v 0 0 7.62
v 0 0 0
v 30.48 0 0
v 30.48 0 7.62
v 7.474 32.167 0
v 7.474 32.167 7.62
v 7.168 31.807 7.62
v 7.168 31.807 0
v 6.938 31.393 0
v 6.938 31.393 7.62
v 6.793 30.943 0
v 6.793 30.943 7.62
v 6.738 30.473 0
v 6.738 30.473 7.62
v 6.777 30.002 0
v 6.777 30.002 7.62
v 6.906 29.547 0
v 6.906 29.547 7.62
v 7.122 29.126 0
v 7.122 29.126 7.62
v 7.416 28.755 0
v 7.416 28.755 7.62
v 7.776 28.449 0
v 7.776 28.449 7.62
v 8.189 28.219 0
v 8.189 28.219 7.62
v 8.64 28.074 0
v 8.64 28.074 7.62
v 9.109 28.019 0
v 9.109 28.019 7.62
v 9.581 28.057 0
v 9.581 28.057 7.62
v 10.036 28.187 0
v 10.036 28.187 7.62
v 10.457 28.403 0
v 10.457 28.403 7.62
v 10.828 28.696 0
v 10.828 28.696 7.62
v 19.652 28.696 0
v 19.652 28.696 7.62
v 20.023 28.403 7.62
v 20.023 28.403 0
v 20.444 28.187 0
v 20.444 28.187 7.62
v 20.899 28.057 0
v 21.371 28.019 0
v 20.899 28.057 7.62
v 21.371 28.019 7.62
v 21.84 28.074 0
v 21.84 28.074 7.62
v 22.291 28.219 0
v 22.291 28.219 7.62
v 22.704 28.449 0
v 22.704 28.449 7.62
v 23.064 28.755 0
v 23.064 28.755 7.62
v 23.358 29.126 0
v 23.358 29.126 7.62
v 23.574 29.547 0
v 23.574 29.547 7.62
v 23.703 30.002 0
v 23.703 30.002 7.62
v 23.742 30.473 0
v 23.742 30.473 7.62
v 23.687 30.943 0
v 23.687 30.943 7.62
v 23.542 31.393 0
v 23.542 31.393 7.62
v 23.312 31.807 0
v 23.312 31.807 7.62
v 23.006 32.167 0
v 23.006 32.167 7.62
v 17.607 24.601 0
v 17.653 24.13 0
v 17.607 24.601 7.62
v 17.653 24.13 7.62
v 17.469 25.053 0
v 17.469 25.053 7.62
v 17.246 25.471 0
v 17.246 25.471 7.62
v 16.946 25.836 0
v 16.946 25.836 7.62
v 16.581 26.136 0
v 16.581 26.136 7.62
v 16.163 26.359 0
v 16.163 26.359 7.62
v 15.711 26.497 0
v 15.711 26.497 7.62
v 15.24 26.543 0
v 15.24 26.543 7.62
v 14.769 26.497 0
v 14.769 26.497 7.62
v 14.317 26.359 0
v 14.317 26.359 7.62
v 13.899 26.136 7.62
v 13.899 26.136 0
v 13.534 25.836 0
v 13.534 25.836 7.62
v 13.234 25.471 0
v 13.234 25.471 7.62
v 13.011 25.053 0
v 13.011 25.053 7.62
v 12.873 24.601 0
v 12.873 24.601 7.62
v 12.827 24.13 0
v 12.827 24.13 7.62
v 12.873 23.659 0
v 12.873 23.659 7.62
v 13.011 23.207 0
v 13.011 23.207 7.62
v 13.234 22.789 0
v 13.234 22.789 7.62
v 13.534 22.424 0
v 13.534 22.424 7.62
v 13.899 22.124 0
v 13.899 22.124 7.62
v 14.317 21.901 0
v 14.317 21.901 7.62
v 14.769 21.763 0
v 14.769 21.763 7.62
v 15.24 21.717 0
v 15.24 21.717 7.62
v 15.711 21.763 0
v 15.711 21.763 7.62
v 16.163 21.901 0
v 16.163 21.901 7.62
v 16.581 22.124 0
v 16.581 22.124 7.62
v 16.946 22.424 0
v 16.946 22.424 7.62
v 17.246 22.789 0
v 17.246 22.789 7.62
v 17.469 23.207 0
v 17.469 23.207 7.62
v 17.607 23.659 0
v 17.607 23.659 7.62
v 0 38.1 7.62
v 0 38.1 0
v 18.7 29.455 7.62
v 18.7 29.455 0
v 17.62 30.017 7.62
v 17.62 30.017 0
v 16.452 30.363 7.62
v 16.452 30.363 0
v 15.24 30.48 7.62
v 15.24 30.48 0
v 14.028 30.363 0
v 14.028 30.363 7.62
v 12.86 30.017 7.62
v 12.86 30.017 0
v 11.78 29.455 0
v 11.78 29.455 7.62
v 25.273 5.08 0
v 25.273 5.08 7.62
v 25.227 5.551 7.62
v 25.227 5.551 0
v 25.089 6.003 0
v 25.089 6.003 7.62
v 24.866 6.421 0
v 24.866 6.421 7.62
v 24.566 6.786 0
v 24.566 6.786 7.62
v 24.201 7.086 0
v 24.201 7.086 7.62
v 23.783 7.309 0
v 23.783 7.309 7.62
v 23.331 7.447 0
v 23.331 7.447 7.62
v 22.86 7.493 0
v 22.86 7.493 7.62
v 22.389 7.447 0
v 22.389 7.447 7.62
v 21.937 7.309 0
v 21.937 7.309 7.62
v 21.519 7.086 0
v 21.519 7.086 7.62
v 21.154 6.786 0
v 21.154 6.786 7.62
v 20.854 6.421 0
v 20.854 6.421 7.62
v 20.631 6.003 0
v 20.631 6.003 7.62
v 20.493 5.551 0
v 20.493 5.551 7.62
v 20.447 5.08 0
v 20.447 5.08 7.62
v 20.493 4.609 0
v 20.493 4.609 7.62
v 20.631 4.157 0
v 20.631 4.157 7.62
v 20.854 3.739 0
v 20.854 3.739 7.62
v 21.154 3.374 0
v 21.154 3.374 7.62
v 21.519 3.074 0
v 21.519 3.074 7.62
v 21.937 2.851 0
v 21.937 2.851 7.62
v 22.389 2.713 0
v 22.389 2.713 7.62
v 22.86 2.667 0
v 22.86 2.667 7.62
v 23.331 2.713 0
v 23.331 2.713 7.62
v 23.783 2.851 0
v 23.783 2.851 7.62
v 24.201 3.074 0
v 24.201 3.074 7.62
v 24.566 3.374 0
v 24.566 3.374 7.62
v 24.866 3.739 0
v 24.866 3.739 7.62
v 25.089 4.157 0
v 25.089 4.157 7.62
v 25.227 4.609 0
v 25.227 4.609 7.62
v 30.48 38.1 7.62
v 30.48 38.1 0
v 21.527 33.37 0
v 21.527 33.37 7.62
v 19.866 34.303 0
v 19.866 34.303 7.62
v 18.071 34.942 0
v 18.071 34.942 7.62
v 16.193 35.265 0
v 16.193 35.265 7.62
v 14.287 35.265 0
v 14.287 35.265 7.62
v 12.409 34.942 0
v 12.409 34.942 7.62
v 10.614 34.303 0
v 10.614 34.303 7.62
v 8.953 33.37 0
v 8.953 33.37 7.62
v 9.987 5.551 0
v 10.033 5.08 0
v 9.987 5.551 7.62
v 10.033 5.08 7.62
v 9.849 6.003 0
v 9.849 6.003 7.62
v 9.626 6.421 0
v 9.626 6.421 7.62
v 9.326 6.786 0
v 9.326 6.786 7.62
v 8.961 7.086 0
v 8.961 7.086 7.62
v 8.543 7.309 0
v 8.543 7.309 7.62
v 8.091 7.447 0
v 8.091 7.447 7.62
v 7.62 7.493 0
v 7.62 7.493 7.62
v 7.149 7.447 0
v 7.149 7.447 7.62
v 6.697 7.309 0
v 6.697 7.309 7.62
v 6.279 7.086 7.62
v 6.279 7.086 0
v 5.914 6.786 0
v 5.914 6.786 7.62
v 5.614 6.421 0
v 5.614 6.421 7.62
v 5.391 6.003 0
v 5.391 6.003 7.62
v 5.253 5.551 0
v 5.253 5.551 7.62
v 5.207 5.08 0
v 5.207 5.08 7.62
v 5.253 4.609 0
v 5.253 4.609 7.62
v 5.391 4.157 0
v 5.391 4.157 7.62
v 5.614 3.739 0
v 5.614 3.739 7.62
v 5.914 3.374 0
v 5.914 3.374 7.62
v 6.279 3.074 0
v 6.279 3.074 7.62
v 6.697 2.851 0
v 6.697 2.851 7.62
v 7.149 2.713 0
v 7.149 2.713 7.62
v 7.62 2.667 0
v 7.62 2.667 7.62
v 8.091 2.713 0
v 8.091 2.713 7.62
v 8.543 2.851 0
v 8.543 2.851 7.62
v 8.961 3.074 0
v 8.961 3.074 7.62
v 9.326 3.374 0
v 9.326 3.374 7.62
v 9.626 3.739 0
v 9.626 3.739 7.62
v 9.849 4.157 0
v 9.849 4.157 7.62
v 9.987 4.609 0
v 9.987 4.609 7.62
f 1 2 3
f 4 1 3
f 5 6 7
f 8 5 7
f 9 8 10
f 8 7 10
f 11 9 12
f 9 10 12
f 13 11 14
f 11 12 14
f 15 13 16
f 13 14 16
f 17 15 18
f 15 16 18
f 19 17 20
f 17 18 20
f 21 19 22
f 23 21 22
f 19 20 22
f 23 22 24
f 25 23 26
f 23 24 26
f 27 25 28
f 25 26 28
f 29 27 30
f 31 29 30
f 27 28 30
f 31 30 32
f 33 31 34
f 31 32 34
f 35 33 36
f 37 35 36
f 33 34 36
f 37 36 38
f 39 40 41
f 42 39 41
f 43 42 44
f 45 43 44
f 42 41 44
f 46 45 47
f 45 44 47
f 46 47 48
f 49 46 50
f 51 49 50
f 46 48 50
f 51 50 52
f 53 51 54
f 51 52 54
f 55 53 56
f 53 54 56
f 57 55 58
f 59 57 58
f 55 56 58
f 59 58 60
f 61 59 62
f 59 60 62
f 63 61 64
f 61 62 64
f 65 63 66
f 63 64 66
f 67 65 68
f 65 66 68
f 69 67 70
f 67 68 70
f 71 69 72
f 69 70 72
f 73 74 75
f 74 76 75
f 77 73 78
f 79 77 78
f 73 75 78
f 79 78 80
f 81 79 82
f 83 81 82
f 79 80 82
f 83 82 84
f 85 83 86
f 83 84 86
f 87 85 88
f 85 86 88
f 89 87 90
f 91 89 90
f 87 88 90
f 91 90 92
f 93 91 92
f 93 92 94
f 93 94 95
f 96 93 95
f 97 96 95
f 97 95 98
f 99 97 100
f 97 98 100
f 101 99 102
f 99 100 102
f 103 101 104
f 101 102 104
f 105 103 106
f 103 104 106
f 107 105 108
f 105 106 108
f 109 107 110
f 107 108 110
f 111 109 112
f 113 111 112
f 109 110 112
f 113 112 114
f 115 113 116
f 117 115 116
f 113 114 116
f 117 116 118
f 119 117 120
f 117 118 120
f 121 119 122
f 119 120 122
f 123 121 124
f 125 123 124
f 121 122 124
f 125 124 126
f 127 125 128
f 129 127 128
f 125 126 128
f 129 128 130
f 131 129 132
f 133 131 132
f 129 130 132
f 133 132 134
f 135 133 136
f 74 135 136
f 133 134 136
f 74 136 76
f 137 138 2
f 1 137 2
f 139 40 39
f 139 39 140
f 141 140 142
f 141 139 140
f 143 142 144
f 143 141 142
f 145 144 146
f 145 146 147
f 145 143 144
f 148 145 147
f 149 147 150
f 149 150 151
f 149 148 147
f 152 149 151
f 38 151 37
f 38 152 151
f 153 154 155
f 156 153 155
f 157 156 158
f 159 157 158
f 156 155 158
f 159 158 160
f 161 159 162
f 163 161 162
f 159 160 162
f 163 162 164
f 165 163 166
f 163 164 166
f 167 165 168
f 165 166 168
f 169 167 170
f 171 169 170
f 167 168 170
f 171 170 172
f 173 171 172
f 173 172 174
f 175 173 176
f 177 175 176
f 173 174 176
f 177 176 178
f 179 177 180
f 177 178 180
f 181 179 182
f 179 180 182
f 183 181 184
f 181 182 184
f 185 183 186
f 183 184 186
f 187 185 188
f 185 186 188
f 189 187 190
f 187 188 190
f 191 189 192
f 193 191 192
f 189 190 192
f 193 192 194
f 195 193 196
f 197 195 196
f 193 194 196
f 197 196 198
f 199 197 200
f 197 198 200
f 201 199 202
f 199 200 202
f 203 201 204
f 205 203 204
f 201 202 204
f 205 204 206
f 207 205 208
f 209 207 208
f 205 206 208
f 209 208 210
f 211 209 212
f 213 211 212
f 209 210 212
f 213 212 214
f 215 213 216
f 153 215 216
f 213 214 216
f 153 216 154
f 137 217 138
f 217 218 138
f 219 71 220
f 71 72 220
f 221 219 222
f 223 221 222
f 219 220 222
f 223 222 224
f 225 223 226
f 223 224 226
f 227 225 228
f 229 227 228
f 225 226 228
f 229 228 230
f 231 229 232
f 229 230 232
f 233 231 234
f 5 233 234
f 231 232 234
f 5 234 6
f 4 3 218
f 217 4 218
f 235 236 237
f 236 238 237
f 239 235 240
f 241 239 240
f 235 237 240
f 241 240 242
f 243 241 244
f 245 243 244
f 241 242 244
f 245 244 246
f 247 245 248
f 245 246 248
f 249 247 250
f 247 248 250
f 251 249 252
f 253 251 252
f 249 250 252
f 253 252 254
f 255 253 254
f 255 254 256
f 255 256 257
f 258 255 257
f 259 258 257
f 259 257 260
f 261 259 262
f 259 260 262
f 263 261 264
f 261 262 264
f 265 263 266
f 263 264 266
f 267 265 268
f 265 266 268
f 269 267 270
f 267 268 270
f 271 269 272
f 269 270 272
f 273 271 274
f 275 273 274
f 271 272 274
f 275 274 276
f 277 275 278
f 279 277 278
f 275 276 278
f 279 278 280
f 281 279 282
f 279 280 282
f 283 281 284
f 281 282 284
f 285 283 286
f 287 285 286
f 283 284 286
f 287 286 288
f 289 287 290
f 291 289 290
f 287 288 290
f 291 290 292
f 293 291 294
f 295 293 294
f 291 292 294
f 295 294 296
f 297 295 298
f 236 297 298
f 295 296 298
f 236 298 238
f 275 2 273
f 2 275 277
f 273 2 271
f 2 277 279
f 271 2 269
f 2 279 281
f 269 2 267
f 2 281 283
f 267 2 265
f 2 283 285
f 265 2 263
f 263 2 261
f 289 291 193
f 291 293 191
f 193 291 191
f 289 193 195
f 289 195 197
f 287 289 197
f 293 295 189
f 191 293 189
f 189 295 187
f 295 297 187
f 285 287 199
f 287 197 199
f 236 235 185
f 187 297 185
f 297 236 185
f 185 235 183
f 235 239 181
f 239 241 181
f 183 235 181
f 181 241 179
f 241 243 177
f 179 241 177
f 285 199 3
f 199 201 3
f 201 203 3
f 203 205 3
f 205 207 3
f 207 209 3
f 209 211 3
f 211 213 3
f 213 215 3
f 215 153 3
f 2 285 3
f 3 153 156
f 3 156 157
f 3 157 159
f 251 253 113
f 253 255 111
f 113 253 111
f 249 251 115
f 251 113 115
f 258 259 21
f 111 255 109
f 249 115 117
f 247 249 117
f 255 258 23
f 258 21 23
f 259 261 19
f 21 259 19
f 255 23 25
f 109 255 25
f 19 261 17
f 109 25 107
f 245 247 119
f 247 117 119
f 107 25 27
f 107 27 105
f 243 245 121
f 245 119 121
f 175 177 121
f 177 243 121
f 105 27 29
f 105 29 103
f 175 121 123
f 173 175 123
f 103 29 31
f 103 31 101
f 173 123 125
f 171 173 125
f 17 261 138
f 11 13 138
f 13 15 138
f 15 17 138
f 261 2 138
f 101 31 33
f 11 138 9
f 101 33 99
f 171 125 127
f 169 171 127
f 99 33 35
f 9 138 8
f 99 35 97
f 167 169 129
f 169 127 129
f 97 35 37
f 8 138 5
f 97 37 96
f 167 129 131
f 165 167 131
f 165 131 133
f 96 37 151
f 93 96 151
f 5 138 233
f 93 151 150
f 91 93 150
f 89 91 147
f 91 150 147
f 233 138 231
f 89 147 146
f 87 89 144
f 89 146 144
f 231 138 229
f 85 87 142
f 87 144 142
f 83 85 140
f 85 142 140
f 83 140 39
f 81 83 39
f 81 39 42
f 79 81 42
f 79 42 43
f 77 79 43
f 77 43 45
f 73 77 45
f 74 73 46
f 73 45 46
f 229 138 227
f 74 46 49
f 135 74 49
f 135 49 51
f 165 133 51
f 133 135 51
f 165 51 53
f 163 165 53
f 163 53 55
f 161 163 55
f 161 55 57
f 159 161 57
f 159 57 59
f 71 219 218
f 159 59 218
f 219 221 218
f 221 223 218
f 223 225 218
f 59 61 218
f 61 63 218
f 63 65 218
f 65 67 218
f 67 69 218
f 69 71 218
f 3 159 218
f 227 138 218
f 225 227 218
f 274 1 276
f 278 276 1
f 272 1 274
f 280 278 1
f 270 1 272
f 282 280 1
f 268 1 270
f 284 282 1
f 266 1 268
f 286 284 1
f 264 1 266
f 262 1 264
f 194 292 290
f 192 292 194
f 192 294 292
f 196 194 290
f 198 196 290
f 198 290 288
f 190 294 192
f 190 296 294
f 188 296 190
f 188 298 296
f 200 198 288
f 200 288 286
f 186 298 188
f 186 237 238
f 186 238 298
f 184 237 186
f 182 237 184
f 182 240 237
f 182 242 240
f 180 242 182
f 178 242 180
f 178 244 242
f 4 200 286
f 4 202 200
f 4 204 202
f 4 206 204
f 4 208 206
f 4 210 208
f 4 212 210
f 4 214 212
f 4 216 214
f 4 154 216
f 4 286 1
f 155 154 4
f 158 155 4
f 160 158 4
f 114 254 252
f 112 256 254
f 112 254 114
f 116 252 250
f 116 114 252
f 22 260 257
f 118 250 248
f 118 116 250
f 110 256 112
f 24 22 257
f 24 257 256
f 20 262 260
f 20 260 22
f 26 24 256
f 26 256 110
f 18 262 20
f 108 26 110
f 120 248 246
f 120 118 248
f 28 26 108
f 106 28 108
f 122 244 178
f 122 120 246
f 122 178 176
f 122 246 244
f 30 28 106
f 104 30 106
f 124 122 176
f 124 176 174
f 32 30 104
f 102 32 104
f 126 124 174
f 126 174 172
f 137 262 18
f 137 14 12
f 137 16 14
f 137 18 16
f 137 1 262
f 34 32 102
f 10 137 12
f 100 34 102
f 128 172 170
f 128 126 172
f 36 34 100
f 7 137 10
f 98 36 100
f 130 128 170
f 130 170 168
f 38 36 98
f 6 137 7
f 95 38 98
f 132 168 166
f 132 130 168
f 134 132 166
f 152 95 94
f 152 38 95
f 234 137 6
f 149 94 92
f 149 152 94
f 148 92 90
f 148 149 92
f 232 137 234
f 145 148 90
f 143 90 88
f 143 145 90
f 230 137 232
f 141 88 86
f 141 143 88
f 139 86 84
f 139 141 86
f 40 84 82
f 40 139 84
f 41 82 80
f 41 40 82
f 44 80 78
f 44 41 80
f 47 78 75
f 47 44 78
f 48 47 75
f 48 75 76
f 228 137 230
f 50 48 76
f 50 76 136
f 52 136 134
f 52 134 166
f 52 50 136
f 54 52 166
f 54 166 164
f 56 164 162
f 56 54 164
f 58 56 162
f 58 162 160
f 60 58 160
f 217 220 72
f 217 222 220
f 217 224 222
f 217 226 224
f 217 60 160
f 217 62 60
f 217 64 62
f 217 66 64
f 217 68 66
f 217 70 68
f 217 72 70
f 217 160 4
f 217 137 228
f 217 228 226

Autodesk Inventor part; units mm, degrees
ref_plane "YZ Plane" through (0, 0, 0) normal (1, 0, 0) x (0, 1, 0)
ref_plane "XZ Plane" through (0, 0, 0) normal (0, 1, 0) x (-1, 0, 0)
ref_plane "XY Plane" through (0, 0, 0) normal (0, 0, 1) x (1, 0, 0)
sketch "Sketch1" plane through (0, 0, 0) normal (0, 0, 1) x (1, 0, 0)
  line L0 (0, 0) -> (30.48, 0)
  line L1 (30.48, 0) -> (30.48, 38.1)
  line L2 (30.48, 38.1) -> (0, 38.1)
  line L3 (0, 38.1) -> (0, 0)
  dimension "d0" = 30.48
  dimension "d1" = 38.1
extrude "Extrusion1" add sketch "Sketch1" along normal blind 7.62
sketch "Sketch2" plane through (0, 0, 7.62) normal (0, 0, 1) x (1, 0, 0)
  line L0 (0, 0) -> (30.48, 0) projected
  line L1 (0, 38.1) -> (0, 0) projected
  line L2 (30.48, 0) -> (30.48, 38.1) projected
  line L3 (15.24, 0) -> (15.24, 5.08) construction
  line L4 (15.24, 5.08) -> (7.62, 5.08) construction
  circle A0 centre (7.62, 5.08) radius 2.413
  line L5 (15.24, 5.08) -> (22.86, 5.08) construction
  circle A1 centre (22.86, 5.08) radius 2.413
  dimension "d4" = 5.08
  dimension "d5" = 7.62
  dimension "d6" = 4.826
extrude "Extrusion2" cut sketch "Sketch2" against normal blind 7.62
sketch "Sketch3" plane through (0, 0, 7.62) normal (0, 0, 1) x (1, 0, 0)
  line L0 (0, 38.1) -> (0, 0) projected
  line L1 (30.48, 38.1) -> (0, 38.1) projected
  line L2 (30.48, 0) -> (30.48, 38.1) projected
  line L3 (15.24, 38.1) -> (15.24, 24.13) construction
  circle A0 centre (15.24, 24.13) radius 2.413
  dimension "d9" = 13.97
  dimension "d10" = 4.826
extrude "Extrusion3" cut sketch "Sketch3" against normal blind 7.62
sketch "Sketch4" plane through (0, 0, 7.62) normal (0, 0, 1) x (1, 0, 0)
  line L0 (0, 38.1) -> (0, 0) projected
  line L1 (30.48, 38.1) -> (0, 38.1) projected
  line L2 (30.48, 0) -> (30.48, 38.1) projected
  circle A0 centre (15.24, 24.13) radius 2.413 projected
  line L3 (15.24, 24.13) -> (15.24, 38.1) construction
  arc A1 (9.7407, 27.305) -> (19.6524, 28.6965) centre (15.24, 24.13) ccw construction
  arc A2 (5.5613, 29.718) -> (23.0058, 32.1671) centre (15.24, 24.13) ccw construction
  line L4 (15.24, 24.13) -> (9.7407, 27.305) construction
  line L5 (15.24, 24.13) -> (25.654, 24.13) construction
  line L6 (15.24, 24.13) -> (20.7393, 27.305) construction
  line L7 (15.24, 24.13) -> (25.654, 24.13) construction
  line L8 (9.7407, 27.305) -> (5.5613, 29.718) construction
  line L9 (20.7393, 27.305) -> (24.9187, 29.718) construction
  arc A3 (7.4742, 32.1671) -> (10.8276, 28.6965) centre (9.1509, 30.4318) ccw
  arc A4 (19.6524, 28.6965) -> (23.0058, 32.1671) centre (21.3291, 30.4318) ccw
  arc A5 (7.4742, 32.1671) -> (5.5613, 29.718) centre (15.24, 24.13) ccw construction
  arc A6 (10.8276, 28.6965) -> (9.7407, 27.305) centre (15.24, 24.13) ccw construction
  arc A7 (19.6524, 28.6965) -> (10.8276, 28.6965) centre (15.24, 24.13) ccw
  arc A8 (23.0058, 32.1671) -> (7.4742, 32.1671) centre (15.24, 24.13) ccw
  arc A9 (23.0058, 32.1671) -> (19.6524, 28.6965) centre (21.3291, 30.4318) ccw construction
  arc A10 (10.8276, 28.6965) -> (7.4742, 32.1671) centre (9.1509, 30.4318) ccw construction
  dimension "d13" = 12.7
  dimension "d14" = 22.352
  dimension "d15" = 150
  dimension "d16" = 30
  dimension "d17" = 4.826
  dimension "d18" = 4.826
extrude "Extrusion4" cut sketch "Sketch4" against normal through all contours A8 A4 A7 A3
properties part number "arm_camera_adapter"
